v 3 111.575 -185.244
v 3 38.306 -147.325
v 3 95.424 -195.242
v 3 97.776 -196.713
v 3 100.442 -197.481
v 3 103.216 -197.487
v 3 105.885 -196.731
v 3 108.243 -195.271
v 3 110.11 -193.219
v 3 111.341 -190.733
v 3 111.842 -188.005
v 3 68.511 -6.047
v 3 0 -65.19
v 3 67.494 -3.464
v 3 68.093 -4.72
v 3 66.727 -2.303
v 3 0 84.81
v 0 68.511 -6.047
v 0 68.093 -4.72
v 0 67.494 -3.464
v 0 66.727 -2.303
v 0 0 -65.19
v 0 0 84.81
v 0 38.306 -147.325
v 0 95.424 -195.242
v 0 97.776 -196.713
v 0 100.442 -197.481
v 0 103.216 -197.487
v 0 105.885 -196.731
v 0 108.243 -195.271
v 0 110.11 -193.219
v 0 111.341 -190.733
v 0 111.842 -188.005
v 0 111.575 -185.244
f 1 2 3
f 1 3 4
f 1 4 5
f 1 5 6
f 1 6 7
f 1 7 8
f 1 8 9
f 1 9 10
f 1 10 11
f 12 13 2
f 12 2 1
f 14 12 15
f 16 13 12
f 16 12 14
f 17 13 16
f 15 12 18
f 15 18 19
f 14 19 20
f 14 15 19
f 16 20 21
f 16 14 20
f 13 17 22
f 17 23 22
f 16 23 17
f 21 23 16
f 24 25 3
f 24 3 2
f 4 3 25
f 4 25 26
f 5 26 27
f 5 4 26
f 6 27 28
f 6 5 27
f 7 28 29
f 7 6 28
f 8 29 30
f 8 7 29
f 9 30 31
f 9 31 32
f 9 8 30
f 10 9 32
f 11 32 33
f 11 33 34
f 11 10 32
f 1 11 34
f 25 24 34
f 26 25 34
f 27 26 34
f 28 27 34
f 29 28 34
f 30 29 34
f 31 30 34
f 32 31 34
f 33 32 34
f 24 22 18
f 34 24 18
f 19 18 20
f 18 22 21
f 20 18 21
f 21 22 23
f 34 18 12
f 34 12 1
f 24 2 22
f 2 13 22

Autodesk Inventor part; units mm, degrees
ref_plane "YZ Plane" through (0, 0, 0) normal (1, 0, 0) x (0, 1, 0)
ref_plane "XZ Plane" through (0, 0, 0) normal (0, 1, 0) x (-1, 0, 0)
ref_plane "XY Plane" through (0, 0, 0) normal (0, 0, 1) x (1, 0, 0)
sketch "スケッチ1" plane through (0, 0, 0) normal (1, 0, 0) x (0, 1, 0)
  line L0 (0, 84.8101) -> (0, -115.1899)
  line L1 (0, -274.6451) -> (0, 144.7193) projected
  line L2 (0, 84.8101) -> (68.0158, -3.9861)
  line L3 (68.0158, -3.9861) -> (118.6619, -214.7359)
  line L4 (118.6619, -214.7359) -> (0, -115.1899)
  point P0 (0, 0)
  dimension "d0" = 200
extrude "押し出し1" add sketch "スケッチ1" along normal blind 3
chamfer "面取り1" distance 50 angle 45 1 edges at (1.5, 0, -115.1899)
fillet "フィレット1" radius 10 2 edges at (1.5, 118.6619, -214.7359) (1.5, 68.0158, -3.9861)
properties part number "type7_stay" material "CFRP"
